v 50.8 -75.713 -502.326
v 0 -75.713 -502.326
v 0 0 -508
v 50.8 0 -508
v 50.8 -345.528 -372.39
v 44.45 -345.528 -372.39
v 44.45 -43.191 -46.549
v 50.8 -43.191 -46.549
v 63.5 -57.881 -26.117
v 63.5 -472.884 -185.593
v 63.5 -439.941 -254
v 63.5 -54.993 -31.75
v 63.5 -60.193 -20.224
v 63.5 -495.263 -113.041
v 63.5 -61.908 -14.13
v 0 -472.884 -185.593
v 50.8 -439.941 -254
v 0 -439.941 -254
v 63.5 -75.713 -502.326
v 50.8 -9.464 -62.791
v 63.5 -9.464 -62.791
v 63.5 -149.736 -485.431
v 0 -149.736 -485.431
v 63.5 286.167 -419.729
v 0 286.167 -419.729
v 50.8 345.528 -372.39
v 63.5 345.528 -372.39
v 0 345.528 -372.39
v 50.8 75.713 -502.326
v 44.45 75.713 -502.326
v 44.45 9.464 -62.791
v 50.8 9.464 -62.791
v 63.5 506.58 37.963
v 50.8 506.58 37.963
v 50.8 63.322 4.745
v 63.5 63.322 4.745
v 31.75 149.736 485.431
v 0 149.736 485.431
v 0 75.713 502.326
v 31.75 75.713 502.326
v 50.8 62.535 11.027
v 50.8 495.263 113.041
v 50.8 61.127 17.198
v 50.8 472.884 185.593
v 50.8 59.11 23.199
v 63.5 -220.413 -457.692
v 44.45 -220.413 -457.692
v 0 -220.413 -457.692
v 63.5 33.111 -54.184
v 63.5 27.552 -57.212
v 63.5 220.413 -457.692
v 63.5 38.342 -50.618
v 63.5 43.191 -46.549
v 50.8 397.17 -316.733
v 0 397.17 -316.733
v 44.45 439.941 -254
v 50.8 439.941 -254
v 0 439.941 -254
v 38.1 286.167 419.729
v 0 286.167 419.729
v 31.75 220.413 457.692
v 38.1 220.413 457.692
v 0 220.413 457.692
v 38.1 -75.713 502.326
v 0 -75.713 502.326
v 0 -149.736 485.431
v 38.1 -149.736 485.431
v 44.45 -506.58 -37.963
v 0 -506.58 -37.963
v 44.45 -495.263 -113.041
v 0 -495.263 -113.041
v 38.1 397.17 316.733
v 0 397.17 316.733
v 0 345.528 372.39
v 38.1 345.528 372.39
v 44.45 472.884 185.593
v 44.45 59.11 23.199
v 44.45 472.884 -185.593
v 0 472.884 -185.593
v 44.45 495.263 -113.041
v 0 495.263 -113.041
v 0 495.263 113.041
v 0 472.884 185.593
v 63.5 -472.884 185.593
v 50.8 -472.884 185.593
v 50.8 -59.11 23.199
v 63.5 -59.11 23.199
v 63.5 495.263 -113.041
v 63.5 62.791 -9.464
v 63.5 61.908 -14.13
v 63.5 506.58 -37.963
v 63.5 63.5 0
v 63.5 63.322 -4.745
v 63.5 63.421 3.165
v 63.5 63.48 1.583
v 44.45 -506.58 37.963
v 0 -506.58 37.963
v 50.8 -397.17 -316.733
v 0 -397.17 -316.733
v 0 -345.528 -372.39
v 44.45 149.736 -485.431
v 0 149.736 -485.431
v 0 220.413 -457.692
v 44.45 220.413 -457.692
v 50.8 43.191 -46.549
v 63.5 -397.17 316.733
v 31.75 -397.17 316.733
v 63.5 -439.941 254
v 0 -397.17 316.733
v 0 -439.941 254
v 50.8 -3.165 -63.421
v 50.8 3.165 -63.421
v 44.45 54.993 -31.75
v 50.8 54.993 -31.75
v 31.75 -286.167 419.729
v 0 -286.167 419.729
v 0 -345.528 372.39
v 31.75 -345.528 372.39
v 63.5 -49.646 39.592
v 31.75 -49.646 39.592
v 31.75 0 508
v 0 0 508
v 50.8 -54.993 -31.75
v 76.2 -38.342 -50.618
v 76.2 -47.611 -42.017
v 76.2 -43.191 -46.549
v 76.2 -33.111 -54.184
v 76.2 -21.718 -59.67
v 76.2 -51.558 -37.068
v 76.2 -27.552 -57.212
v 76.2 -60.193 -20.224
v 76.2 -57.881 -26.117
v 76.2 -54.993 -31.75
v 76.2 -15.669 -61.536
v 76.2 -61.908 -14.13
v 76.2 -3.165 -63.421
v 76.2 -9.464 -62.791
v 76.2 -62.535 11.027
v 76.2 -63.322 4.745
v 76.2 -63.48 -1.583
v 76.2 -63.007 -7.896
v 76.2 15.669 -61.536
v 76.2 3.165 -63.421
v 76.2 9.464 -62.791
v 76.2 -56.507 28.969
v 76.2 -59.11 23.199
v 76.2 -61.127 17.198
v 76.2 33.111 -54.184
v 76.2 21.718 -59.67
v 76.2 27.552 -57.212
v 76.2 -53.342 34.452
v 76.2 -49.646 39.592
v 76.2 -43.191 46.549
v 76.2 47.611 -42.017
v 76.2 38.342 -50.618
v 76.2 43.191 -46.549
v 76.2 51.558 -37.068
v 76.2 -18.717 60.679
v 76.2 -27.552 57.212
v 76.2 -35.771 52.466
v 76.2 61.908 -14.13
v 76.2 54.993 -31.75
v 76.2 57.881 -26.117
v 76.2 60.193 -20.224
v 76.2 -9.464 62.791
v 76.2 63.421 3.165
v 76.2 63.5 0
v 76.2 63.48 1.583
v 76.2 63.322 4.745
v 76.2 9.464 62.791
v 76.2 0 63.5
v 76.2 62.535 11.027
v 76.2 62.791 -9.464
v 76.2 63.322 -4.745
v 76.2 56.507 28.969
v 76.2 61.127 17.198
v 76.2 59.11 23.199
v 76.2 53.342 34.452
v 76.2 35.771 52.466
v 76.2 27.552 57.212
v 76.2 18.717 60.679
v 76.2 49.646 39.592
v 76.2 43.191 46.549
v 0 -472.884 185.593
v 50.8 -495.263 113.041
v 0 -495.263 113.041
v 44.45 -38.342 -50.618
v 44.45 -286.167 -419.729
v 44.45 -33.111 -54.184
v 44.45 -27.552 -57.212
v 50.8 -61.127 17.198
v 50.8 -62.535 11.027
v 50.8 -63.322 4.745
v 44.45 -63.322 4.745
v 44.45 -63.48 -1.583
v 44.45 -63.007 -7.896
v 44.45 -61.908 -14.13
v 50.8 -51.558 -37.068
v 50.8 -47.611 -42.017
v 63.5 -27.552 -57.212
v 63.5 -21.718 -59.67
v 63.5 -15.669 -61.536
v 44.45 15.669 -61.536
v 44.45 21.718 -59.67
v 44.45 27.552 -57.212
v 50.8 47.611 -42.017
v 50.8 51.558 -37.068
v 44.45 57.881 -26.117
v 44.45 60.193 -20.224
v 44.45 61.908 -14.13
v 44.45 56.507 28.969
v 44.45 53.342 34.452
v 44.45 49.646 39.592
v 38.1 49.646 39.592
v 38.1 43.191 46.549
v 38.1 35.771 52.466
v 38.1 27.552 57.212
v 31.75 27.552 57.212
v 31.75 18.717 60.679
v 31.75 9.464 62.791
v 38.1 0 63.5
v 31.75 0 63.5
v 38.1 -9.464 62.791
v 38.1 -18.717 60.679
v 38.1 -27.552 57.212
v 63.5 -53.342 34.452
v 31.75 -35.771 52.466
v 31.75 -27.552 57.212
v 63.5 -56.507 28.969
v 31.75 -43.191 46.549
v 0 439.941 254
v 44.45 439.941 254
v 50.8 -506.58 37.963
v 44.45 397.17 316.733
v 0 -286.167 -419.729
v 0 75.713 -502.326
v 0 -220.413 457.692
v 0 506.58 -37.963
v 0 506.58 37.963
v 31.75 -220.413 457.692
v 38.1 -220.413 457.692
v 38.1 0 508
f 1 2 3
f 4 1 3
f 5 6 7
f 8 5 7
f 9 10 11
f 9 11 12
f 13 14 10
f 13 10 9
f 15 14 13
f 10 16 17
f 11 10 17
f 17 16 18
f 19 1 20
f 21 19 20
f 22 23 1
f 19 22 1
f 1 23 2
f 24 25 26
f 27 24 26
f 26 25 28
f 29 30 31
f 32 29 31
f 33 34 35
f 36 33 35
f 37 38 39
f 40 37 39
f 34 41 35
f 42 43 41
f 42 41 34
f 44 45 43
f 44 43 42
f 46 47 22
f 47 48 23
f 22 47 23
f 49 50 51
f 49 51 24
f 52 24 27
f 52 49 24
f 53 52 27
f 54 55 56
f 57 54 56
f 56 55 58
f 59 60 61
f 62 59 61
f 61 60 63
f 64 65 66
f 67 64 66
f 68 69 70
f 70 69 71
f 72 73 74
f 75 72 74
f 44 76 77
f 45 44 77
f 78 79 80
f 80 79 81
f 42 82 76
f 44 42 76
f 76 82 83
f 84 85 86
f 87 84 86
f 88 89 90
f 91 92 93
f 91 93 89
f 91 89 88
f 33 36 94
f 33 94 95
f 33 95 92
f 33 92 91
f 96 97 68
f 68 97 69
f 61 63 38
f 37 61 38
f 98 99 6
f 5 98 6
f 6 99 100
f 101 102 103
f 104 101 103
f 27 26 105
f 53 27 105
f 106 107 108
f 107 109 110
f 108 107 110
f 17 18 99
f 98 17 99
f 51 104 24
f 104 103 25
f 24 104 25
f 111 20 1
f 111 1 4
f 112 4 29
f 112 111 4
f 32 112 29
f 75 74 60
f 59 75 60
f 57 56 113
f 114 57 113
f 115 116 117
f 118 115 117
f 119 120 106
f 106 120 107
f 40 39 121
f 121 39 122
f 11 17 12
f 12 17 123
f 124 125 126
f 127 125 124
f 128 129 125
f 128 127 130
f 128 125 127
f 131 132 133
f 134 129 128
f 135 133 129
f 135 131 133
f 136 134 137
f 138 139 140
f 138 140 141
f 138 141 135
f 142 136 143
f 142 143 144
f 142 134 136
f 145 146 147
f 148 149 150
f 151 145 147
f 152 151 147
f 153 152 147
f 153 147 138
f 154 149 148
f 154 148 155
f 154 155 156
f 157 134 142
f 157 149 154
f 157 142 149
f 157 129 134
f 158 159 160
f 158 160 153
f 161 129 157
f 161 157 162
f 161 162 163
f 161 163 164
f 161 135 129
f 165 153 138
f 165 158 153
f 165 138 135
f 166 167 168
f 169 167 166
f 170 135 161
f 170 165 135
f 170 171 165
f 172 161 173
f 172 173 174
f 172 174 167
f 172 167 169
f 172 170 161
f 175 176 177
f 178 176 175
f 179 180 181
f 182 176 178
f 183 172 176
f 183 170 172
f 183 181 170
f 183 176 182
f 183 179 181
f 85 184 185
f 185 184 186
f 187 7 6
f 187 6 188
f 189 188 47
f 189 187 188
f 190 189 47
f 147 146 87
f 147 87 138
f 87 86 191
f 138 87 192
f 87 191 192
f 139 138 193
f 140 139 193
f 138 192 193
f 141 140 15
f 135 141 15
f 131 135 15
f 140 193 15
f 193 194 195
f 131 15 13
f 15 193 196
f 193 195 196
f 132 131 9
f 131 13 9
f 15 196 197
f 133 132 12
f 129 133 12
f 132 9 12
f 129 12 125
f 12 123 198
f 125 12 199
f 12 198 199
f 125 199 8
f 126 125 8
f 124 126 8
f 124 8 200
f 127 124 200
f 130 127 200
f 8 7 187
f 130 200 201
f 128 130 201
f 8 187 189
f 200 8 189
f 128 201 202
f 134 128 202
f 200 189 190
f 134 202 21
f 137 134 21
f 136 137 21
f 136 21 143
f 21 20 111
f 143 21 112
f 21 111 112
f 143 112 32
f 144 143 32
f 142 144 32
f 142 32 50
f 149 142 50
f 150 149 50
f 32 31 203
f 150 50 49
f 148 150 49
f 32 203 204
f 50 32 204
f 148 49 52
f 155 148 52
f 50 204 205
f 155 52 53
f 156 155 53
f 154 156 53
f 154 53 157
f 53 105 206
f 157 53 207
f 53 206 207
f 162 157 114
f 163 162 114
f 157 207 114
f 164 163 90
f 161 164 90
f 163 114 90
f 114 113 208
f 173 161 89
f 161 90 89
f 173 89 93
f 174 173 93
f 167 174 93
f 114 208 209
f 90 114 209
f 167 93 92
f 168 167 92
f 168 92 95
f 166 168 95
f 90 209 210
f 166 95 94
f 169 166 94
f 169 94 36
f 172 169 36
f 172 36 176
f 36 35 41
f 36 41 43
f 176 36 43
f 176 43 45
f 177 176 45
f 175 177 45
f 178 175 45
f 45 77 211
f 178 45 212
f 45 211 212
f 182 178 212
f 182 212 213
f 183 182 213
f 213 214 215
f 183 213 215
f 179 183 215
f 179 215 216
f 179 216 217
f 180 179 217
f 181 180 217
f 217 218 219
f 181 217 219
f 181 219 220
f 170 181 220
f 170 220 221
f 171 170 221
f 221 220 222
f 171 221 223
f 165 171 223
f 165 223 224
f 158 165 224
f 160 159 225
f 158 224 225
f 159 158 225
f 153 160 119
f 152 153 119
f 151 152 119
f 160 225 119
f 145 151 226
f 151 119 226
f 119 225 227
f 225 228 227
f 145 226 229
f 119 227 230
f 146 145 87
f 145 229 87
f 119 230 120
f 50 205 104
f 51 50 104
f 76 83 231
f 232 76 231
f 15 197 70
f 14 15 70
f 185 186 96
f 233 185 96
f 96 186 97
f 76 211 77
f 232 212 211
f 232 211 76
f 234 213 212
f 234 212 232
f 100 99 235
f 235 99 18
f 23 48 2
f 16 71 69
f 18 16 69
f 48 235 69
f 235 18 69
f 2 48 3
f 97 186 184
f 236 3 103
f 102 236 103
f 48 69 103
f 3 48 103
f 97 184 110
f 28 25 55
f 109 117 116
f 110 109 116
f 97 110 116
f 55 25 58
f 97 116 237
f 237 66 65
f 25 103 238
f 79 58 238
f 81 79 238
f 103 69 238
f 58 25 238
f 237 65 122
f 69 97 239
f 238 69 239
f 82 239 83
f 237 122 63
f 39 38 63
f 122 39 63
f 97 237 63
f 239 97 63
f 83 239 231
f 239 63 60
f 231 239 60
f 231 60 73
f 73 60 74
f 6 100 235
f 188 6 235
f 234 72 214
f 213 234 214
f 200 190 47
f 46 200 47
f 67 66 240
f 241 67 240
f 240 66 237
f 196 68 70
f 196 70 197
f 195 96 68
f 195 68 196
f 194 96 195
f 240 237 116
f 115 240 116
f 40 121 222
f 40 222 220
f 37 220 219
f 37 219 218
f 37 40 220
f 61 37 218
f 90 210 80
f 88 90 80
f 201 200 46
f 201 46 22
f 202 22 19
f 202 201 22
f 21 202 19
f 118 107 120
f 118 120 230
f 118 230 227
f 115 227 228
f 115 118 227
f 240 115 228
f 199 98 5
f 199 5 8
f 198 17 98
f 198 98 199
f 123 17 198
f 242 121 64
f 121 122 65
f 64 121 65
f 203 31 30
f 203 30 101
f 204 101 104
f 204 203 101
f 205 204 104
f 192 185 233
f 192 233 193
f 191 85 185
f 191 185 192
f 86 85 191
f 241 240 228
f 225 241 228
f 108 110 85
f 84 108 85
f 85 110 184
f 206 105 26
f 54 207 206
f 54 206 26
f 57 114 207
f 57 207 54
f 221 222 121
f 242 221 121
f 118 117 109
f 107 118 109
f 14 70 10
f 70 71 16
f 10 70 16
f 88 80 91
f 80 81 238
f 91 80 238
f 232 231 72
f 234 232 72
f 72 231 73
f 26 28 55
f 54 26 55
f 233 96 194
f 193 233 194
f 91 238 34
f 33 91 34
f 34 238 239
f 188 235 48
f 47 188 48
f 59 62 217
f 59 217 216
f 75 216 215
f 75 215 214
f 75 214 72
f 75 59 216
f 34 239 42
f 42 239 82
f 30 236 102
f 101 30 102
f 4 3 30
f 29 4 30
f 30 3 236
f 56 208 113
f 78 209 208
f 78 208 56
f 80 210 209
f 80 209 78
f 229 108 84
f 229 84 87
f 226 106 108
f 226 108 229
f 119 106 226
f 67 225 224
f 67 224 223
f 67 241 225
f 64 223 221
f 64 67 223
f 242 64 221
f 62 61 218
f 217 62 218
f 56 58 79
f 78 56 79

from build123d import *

# Parameters (mm, degrees)
F1_DEPTH = 25.4
F2_DEPTH = 31.75
F3_DEPTH = 38.1
F4_DEPTH = 44.45
F5_DEPTH = 50.8
F6_DEPTH = 63.5
F7_DEPTH = 76.2


with BuildPart() as f1:
    # F0 (on Right) → F1 (new body)
    with BuildSketch(Plane.YZ):
        with BuildLine():
            ThreePointArc((-27.551617434, 57.2115231118), (-14.1300793062, 61.9079224235), (0, 63.5))
            Line((0, 63.5), (0, 508))
            Line((0, 508), (-75.7134712175, 502.3260597224))
            Line((-75.7134712175, 502.3260597224), (-149.7356286007, 485.4309853394))
            Line((-149.7356286007, 485.4309853394), (-220.4129394717, 457.6921848944))
            Line((-220.4129394717, 457.6921848944), (-27.551617434, 57.2115231118))
        make_face()
        with BuildLine():
            Line((0, 508), (0, 63.5))
            ThreePointArc((0, 63.5), (14.1300793062, 61.9079224235), (27.551617434, 57.2115231118))
            Line((27.551617434, 57.2115231118), (220.4129394717, 457.6921848944))
            Line((220.4129394717, 457.6921848944), (149.7356286007, 485.4309853394))
            Line((149.7356286007, 485.4309853394), (75.7134712175, 502.3260597224))
            Line((75.7134712175, 502.3260597224), (0, 508))
        make_face()
        with BuildLine():
            Line((220.4129394717, 457.6921848944), (27.551617434, 57.2115231118))
            ThreePointArc((27.551617434, 57.2115231118), (39.591602418, 49.6462991367), (49.6462991367, 39.591602418))
            Line((49.6462991367, 39.591602418), (397.1703930938, 316.7328193442))
            Line((397.1703930938, 316.7328193442), (345.5277507876, 372.3903508896))
            Line((345.5277507876, 372.3903508896), (286.1665894963, 419.7292973525))
            Line((286.1665894963, 419.7292973525), (220.4129394717, 457.6921848944))
        make_face()
        with BuildLine():
            Line((59.1104830389, 23.1991550473), (472.8838643113, 185.5932403781))
            Line((472.8838643113, 185.5932403781), (439.9409051225, 254))
            Line((439.9409051225, 254), (397.1703930938, 316.7328193442))
            Line((397.1703930938, 316.7328193442), (49.6462991367, 39.591602418))
            ThreePointArc((49.6462991367, 39.591602418), (54.9926131403, 31.75), (59.1104830389, 23.1991550473))
        make_face()
        with BuildLine():
            Line((63.322441121, 4.7453609427), (506.579528968, 37.9628875419))
            Line((506.579528968, 37.9628875419), (495.2633793884, 113.0406344498))
            Line((495.2633793884, 113.0406344498), (472.8838643113, 185.5932403781))
            Line((472.8838643113, 185.5932403781), (59.1104830389, 23.1991550473))
            ThreePointArc((59.1104830389, 23.1991550473), (61.9079224235, 14.1300793062), (63.322441121, 4.7453609427))
        make_face()
        with BuildLine():
            Line((506.579528968, -37.9628875419), (506.579528968, 37.9628875419))
            Line((506.579528968, 37.9628875419), (63.322441121, 4.7453609427))
            ThreePointArc((63.322441121, 4.7453609427), (63.4555947541, 2.3743408365), (63.5, 0))
            ThreePointArc((63.5, 0), (63.1007253282, -7.1097442326), (61.9079224235, -14.1300793062))
            Line((61.9079224235, -14.1300793062), (495.2633793884, -113.0406344498))
            Line((495.2633793884, -113.0406344498), (506.579528968, -37.9628875419))
        make_face()
        with BuildLine():
            Line((472.8838643113, -185.5932403781), (495.2633793884, -113.0406344498))
            Line((495.2633793884, -113.0406344498), (61.9079224235, -14.1300793062))
            ThreePointArc((61.9079224235, -14.1300793062), (59.1104830389, -23.1991550473), (54.9926131403, -31.75))
            Line((54.9926131403, -31.75), (439.9409051225, -254))
            Line((439.9409051225, -254), (472.8838643113, -185.5932403781))
        make_face()
        with BuildLine():
            Line((439.9409051225, -254), (54.9926131403, -31.75))
            ThreePointArc((54.9926131403, -31.75), (49.6462991367, -39.591602418), (43.1909688485, -46.5487938612))
            Line((43.1909688485, -46.5487938612), (345.5277507876, -372.3903508896))
            Line((345.5277507876, -372.3903508896), (397.1703930938, -316.7328193442))
            Line((397.1703930938, -316.7328193442), (439.9409051225, -254))
        make_face()
        with BuildLine():
            Line((345.5277507876, -372.3903508896), (43.1909688485, -46.5487938612))
            ThreePointArc((43.1909688485, -46.5487938612), (35.770823687, -52.4661621691), (27.551617434, -57.2115231118))
            Line((27.551617434, -57.2115231118), (220.4129394717, -457.6921848944))
            Line((220.4129394717, -457.6921848944), (286.1665894963, -419.7292973525))
            Line((286.1665894963, -419.7292973525), (345.5277507876, -372.3903508896))
        make_face()
        with BuildLine():
            Line((220.4129394717, -457.6921848944), (27.551617434, -57.2115231118))
            ThreePointArc((27.551617434, -57.2115231118), (18.7169535751, -60.6788731674), (9.4641839022, -62.7907574653))
            Line((9.4641839022, -62.7907574653), (75.7134712175, -502.3260597224))
            Line((75.7134712175, -502.3260597224), (149.7356286007, -485.4309853394))
            Line((149.7356286007, -485.4309853394), (220.4129394717, -457.6921848944))
        make_face()
        with BuildLine():
            Line((75.7134712175, -502.3260597224), (9.4641839022, -62.7907574653))
            ThreePointArc((9.4641839022, -62.7907574653), (0, -63.5), (-9.4641839022, -62.7907574653))
            Line((-9.4641839022, -62.7907574653), (-75.7134712175, -502.3260597224))
            Line((-75.7134712175, -502.3260597224), (0, -508))
            Line((0, -508), (75.7134712175, -502.3260597224))
        make_face()
        with BuildLine():
            Line((-75.7134712175, -502.3260597224), (-9.4641839022, -62.7907574653))
            ThreePointArc((-9.4641839022, -62.7907574653), (-18.7169535751, -60.6788731674), (-27.551617434, -57.2115231118))
            Line((-27.551617434, -57.2115231118), (-220.4129394717, -457.6921848944))
            Line((-220.4129394717, -457.6921848944), (-149.7356286007, -485.4309853394))
            Line((-149.7356286007, -485.4309853394), (-75.7134712175, -502.3260597224))
        make_face()
        with BuildLine():
            Line((-220.4129394717, -457.6921848944), (-27.551617434, -57.2115231118))
            ThreePointArc((-27.551617434, -57.2115231118), (-35.770823687, -52.4661621691), (-43.1909688485, -46.5487938612))
            Line((-43.1909688485, -46.5487938612), (-345.5277507876, -372.3903508896))
            Line((-345.5277507876, -372.3903508896), (-286.1665894963, -419.7292973525))
            Line((-286.1665894963, -419.7292973525), (-220.4129394717, -457.6921848944))
        make_face()
        with BuildLine():
            Line((-345.5277507876, -372.3903508896), (-43.1909688485, -46.5487938612))
            ThreePointArc((-43.1909688485, -46.5487938612), (-49.6462991367, -39.591602418), (-54.9926131403, -31.75))
            Line((-54.9926131403, -31.75), (-439.9409051225, -254))
            Line((-439.9409051225, -254), (-397.1703930938, -316.7328193442))
            Line((-397.1703930938, -316.7328193442), (-345.5277507876, -372.3903508896))
        make_face()
        with BuildLine():
            Line((-439.9409051225, -254), (-54.9926131403, -31.75))
            ThreePointArc((-54.9926131403, -31.75), (-59.1104830389, -23.1991550473), (-61.9079224235, -14.1300793062))
            Line((-61.9079224235, -14.1300793062), (-495.2633793884, -113.0406344498))
            Line((-495.2633793884, -113.0406344498), (-472.8838643113, -185.5932403781))
            Line((-472.8838643113, -185.5932403781), (-439.9409051225, -254))
        make_face()
        with BuildLine():
            Line((-495.2633793884, -113.0406344498), (-61.9079224235, -14.1300793062))
            ThreePointArc((-61.9079224235, -14.1300793062), (-63.322441121, -4.7453609427), (-63.322441121, 4.7453609427))
            Line((-63.322441121, 4.7453609427), (-506.579528968, 37.9628875419))
            Line((-506.579528968, 37.9628875419), (-506.579528968, -37.9628875419))
            Line((-506.579528968, -37.9628875419), (-495.2633793884, -113.0406344498))
        make_face()
        with BuildLine():
            Line((-506.579528968, 37.9628875419), (-63.322441121, 4.7453609427))
            ThreePointArc((-63.322441121, 4.7453609427), (-61.9079224235, 14.1300793062), (-59.1104830389, 23.1991550473))
            Line((-59.1104830389, 23.1991550473), (-472.8838643113, 185.5932403781))
            Line((-472.8838643113, 185.5932403781), (-495.2633793884, 113.0406344498))
            Line((-495.2633793884, 113.0406344498), (-506.579528968, 37.9628875419))
        make_face()
        with BuildLine():
            ThreePointArc((-59.1104830389, 23.1991550473), (-54.9926131403, 31.75), (-49.6462991367, 39.591602418))
            Line((-49.6462991367, 39.591602418), (-397.1703930938, 316.7328193442))
            Line((-397.1703930938, 316.7328193442), (-439.9409051225, 254))
            Line((-439.9409051225, 254), (-472.8838643113, 185.5932403781))
            Line((-472.8838643113, 185.5932403781), (-59.1104830389, 23.1991550473))
        make_face()
        with BuildLine():
            ThreePointArc((-49.6462991367, 39.591602418), (-39.591602418, 49.6462991367), (-27.551617434, 57.2115231118))
            Line((-27.551617434, 57.2115231118), (-220.4129394717, 457.6921848944))
            Line((-220.4129394717, 457.6921848944), (-286.1665894963, 419.7292973525))
            Line((-286.1665894963, 419.7292973525), (-345.5277507876, 372.3903508896))
            Line((-345.5277507876, 372.3903508896), (-397.1703930938, 316.7328193442))
            Line((-397.1703930938, 316.7328193442), (-49.6462991367, 39.591602418))
        make_face()
    extrude(amount=F1_DEPTH)

    # F0 (on Right) → F2 (join)
    with BuildSketch(Plane.YZ):
        with BuildLine():
            Line((0, 508), (0, 63.5))
            ThreePointArc((0, 63.5), (14.1300793062, 61.9079224235), (27.551617434, 57.2115231118))
            Line((27.551617434, 57.2115231118), (220.4129394717, 457.6921848944))
            Line((220.4129394717, 457.6921848944), (149.7356286007, 485.4309853394))
            Line((149.7356286007, 485.4309853394), (75.7134712175, 502.3260597224))
            Line((75.7134712175, 502.3260597224), (0, 508))
        make_face()
        with BuildLine():
            ThreePointArc((-49.6462991367, 39.591602418), (-39.591602418, 49.6462991367), (-27.551617434, 57.2115231118))
            Line((-27.551617434, 57.2115231118), (-220.4129394717, 457.6921848944))
            Line((-220.4129394717, 457.6921848944), (-286.1665894963, 419.7292973525))
            Line((-286.1665894963, 419.7292973525), (-345.5277507876, 372.3903508896))
            Line((-345.5277507876, 372.3903508896), (-397.1703930938, 316.7328193442))
            Line((-397.1703930938, 316.7328193442), (-49.6462991367, 39.591602418))
        make_face()
        with BuildLine():
            Line((0, 63.5), (0, 0))
            Line((0, 0), (27.551617434, 57.2115231118))
            ThreePointArc((27.551617434, 57.2115231118), (14.1300793062, 61.9079224235), (0, 63.5))
        make_face()
        with BuildLine():
            Line((-27.551617434, 57.2115231118), (0, 0))
            Line((0, 0), (0, 63.5))
            ThreePointArc((0, 63.5), (-14.1300793062, 61.9079224235), (-27.551617434, 57.2115231118))
        make_face()
        with BuildLine():
            Line((-49.6462991367, 39.591602418), (0, 0))
            Line((0, 0), (-27.551617434, 57.2115231118))
            ThreePointArc((-27.551617434, 57.2115231118), (-39.591602418, 49.6462991367), (-49.6462991367, 39.591602418))
        make_face()
    extrude(amount=F2_DEPTH)

    # F0 (on Right) → F3 (join)
    with BuildSketch(Plane.YZ):
        with BuildLine():
            ThreePointArc((-27.551617434, 57.2115231118), (-14.1300793062, 61.9079224235), (0, 63.5))
            Line((0, 63.5), (0, 508))
            Line((0, 508), (-75.7134712175, 502.3260597224))
            Line((-75.7134712175, 502.3260597224), (-149.7356286007, 485.4309853394))
            Line((-149.7356286007, 485.4309853394), (-220.4129394717, 457.6921848944))
            Line((-220.4129394717, 457.6921848944), (-27.551617434, 57.2115231118))
        make_face()
        with BuildLine():
            Line((220.4129394717, 457.6921848944), (27.551617434, 57.2115231118))
            ThreePointArc((27.551617434, 57.2115231118), (39.591602418, 49.6462991367), (49.6462991367, 39.591602418))
            Line((49.6462991367, 39.591602418), (397.1703930938, 316.7328193442))
            Line((397.1703930938, 316.7328193442), (345.5277507876, 372.3903508896))
            Line((345.5277507876, 372.3903508896), (286.1665894963, 419.7292973525))
            Line((286.1665894963, 419.7292973525), (220.4129394717, 457.6921848944))
        make_face()
        with BuildLine():
            Line((27.551617434, 57.2115231118), (0, 0))
            Line((0, 0), (49.6462991367, 39.591602418))
            ThreePointArc((49.6462991367, 39.591602418), (39.591602418, 49.6462991367), (27.551617434, 57.2115231118))
        make_face()
        with BuildLine():
            Line((0, 63.5), (0, 0))
            Line((0, 0), (27.551617434, 57.2115231118))
            ThreePointArc((27.551617434, 57.2115231118), (14.1300793062, 61.9079224235), (0, 63.5))
        make_face()
        with BuildLine():
            Line((-27.551617434, 57.2115231118), (0, 0))
            Line((0, 0), (0, 63.5))
            ThreePointArc((0, 63.5), (-14.1300793062, 61.9079224235), (-27.551617434, 57.2115231118))
        make_face()
    extrude(amount=F3_DEPTH)

    # F0 (on Right) → F4 (join)
    with BuildSketch(Plane.YZ):
        with BuildLine():
            Line((59.1104830389, 23.1991550473), (472.8838643113, 185.5932403781))
            Line((472.8838643113, 185.5932403781), (439.9409051225, 254))
            Line((439.9409051225, 254), (397.1703930938, 316.7328193442))
            Line((397.1703930938, 316.7328193442), (49.6462991367, 39.591602418))
            ThreePointArc((49.6462991367, 39.591602418), (54.9926131403, 31.75), (59.1104830389, 23.1991550473))
        make_face()
        with BuildLine():
            Line((472.8838643113, -185.5932403781), (495.2633793884, -113.0406344498))
            Line((495.2633793884, -113.0406344498), (61.9079224235, -14.1300793062))
            ThreePointArc((61.9079224235, -14.1300793062), (59.1104830389, -23.1991550473), (54.9926131403, -31.75))
            Line((54.9926131403, -31.75), (439.9409051225, -254))
            Line((439.9409051225, -254), (472.8838643113, -185.5932403781))
        make_face()
        with BuildLine():
            Line((220.4129394717, -457.6921848944), (27.551617434, -57.2115231118))
            ThreePointArc((27.551617434, -57.2115231118), (18.7169535751, -60.6788731674), (9.4641839022, -62.7907574653))
            Line((9.4641839022, -62.7907574653), (75.7134712175, -502.3260597224))
            Line((75.7134712175, -502.3260597224), (149.7356286007, -485.4309853394))
            Line((149.7356286007, -485.4309853394), (220.4129394717, -457.6921848944))
        make_face()
        with BuildLine():
            Line((-220.4129394717, -457.6921848944), (-27.551617434, -57.2115231118))
            ThreePointArc((-27.551617434, -57.2115231118), (-35.770823687, -52.4661621691), (-43.1909688485, -46.5487938612))
            Line((-43.1909688485, -46.5487938612), (-345.5277507876, -372.3903508896))
            Line((-345.5277507876, -372.3903508896), (-286.1665894963, -419.7292973525))
            Line((-286.1665894963, -419.7292973525), (-220.4129394717, -457.6921848944))
        make_face()
        with BuildLine():
            Line((-495.2633793884, -113.0406344498), (-61.9079224235, -14.1300793062))
            ThreePointArc((-61.9079224235, -14.1300793062), (-63.322441121, -4.7453609427), (-63.322441121, 4.7453609427))
            Line((-63.322441121, 4.7453609427), (-506.579528968, 37.9628875419))
            Line((-506.579528968, 37.9628875419), (-506.579528968, -37.9628875419))
            Line((-506.579528968, -37.9628875419), (-495.2633793884, -113.0406344498))
        make_face()
        with BuildLine():
            Line((49.6462991367, 39.591602418), (0, 0))
            Line((0, 0), (59.1104830389, 23.1991550473))
            ThreePointArc((59.1104830389, 23.1991550473), (54.9926131403, 31.75), (49.6462991367, 39.591602418))
        make_face()
        with BuildLine():
            Line((0, 0), (63.322441121, 4.7453609427))
            ThreePointArc((63.322441121, 4.7453609427), (61.9079224235, 14.1300793062), (59.1104830389, 23.1991550473))
            Line((59.1104830389, 23.1991550473), (0, 0))
        make_face()
        with BuildLine():
            ThreePointArc((63.5, 0), (63.4555947541, 2.3743408365), (63.322441121, 4.7453609427))
            Line((63.322441121, 4.7453609427), (0, 0))
            Line((0, 0), (61.9079224235, -14.1300793062))
            ThreePointArc((61.9079224235, -14.1300793062), (63.1007253282, -7.1097442326), (63.5, 0))
        make_face()
        with BuildLine():
            Line((61.9079224235, -14.1300793062), (0, 0))
            Line((0, 0), (54.9926131403, -31.75))
            ThreePointArc((54.9926131403, -31.75), (59.1104830389, -23.1991550473), (61.9079224235, -14.1300793062))
        make_face()
        with BuildLine():
            Line((54.9926131403, -31.75), (0, 0))
            Line((0, 0), (43.1909688485, -46.5487938612))
            ThreePointArc((43.1909688485, -46.5487938612), (49.6462991367, -39.591602418), (54.9926131403, -31.75))
        make_face()
        with BuildLine():
            Line((43.1909688485, -46.5487938612), (0, 0))
            Line((0, 0), (27.551617434, -57.2115231118))
            ThreePointArc((27.551617434, -57.2115231118), (35.770823687, -52.4661621691), (43.1909688485, -46.5487938612))
        make_face()
        with BuildLine():
            Line((27.551617434, -57.2115231118), (0, 0))
            Line((0, 0), (9.4641839022, -62.7907574653))
            ThreePointArc((9.4641839022, -62.7907574653), (18.7169535751, -60.6788731674), (27.551617434, -57.2115231118))
        make_face()
        with BuildLine():
            Line((9.4641839022, -62.7907574653), (0, 0))
            Line((0, 0), (-9.4641839022, -62.7907574653))
            ThreePointArc((-9.4641839022, -62.7907574653), (0, -63.5), (9.4641839022, -62.7907574653))
        make_face()
        with BuildLine():
            Line((-9.4641839022, -62.7907574653), (0, 0))
            Line((0, 0), (-27.551617434, -57.2115231118))
            ThreePointArc((-27.551617434, -57.2115231118), (-18.7169535751, -60.6788731674), (-9.4641839022, -62.7907574653))
        make_face()
        with BuildLine():
            Line((-27.551617434, -57.2115231118), (0, 0))
            Line((0, 0), (-43.1909688485, -46.5487938612))
            ThreePointArc((-43.1909688485, -46.5487938612), (-35.770823687, -52.4661621691), (-27.551617434, -57.2115231118))
        make_face()
        with BuildLine():
            Line((-43.1909688485, -46.5487938612), (0, 0))
            Line((0, 0), (-54.9926131403, -31.75))
            ThreePointArc((-54.9926131403, -31.75), (-49.6462991367, -39.591602418), (-43.1909688485, -46.5487938612))
        make_face()
        with BuildLine():
            Line((-54.9926131403, -31.75), (0, 0))
            Line((0, 0), (-61.9079224235, -14.1300793062))
            ThreePointArc((-61.9079224235, -14.1300793062), (-59.1104830389, -23.1991550473), (-54.9926131403, -31.75))
        make_face()
        with BuildLine():
            Line((-61.9079224235, -14.1300793062), (0, 0))
            Line((0, 0), (-63.322441121, 4.7453609427))
            ThreePointArc((-63.322441121, 4.7453609427), (-63.322441121, -4.7453609427), (-61.9079224235, -14.1300793062))
        make_face()
    extrude(amount=F4_DEPTH)

    # F0 (on Right) → F5 (join)
    with BuildSketch(Plane.YZ):
        with BuildLine():
            Line((63.322441121, 4.7453609427), (506.579528968, 37.9628875419))
            Line((506.579528968, 37.9628875419), (495.2633793884, 113.0406344498))
            Line((495.2633793884, 113.0406344498), (472.8838643113, 185.5932403781))
            Line((472.8838643113, 185.5932403781), (59.1104830389, 23.1991550473))
            ThreePointArc((59.1104830389, 23.1991550473), (61.9079224235, 14.1300793062), (63.322441121, 4.7453609427))
        make_face()
        with BuildLine():
            Line((439.9409051225, -254), (54.9926131403, -31.75))
            ThreePointArc((54.9926131403, -31.75), (49.6462991367, -39.591602418), (43.1909688485, -46.5487938612))
            Line((43.1909688485, -46.5487938612), (345.5277507876, -372.3903508896))
            Line((345.5277507876, -372.3903508896), (397.1703930938, -316.7328193442))
            Line((397.1703930938, -316.7328193442), (439.9409051225, -254))
        make_face()
        with BuildLine():
            Line((75.7134712175, -502.3260597224), (9.4641839022, -62.7907574653))
            ThreePointArc((9.4641839022, -62.7907574653), (0, -63.5), (-9.4641839022, -62.7907574653))
            Line((-9.4641839022, -62.7907574653), (-75.7134712175, -502.3260597224))
            Line((-75.7134712175, -502.3260597224), (0, -508))
            Line((0, -508), (75.7134712175, -502.3260597224))
        make_face()
        with BuildLine():
            Line((-345.5277507876, -372.3903508896), (-43.1909688485, -46.5487938612))
            ThreePointArc((-43.1909688485, -46.5487938612), (-49.6462991367, -39.591602418), (-54.9926131403, -31.75))
            Line((-54.9926131403, -31.75), (-439.9409051225, -254))
            Line((-439.9409051225, -254), (-397.1703930938, -316.7328193442))
            Line((-397.1703930938, -316.7328193442), (-345.5277507876, -372.3903508896))
        make_face()
        with BuildLine():
            Line((-506.579528968, 37.9628875419), (-63.322441121, 4.7453609427))
            ThreePointArc((-63.322441121, 4.7453609427), (-61.9079224235, 14.1300793062), (-59.1104830389, 23.1991550473))
            Line((-59.1104830389, 23.1991550473), (-472.8838643113, 185.5932403781))
            Line((-472.8838643113, 185.5932403781), (-495.2633793884, 113.0406344498))
            Line((-495.2633793884, 113.0406344498), (-506.579528968, 37.9628875419))
        make_face()
        with BuildLine():
            Line((0, 0), (63.322441121, 4.7453609427))
            ThreePointArc((63.322441121, 4.7453609427), (61.9079224235, 14.1300793062), (59.1104830389, 23.1991550473))
            Line((59.1104830389, 23.1991550473), (0, 0))
        make_face()
        with BuildLine():
            ThreePointArc((63.5, 0), (63.4555947541, 2.3743408365), (63.322441121, 4.7453609427))
            Line((63.322441121, 4.7453609427), (0, 0))
            Line((0, 0), (61.9079224235, -14.1300793062))
            ThreePointArc((61.9079224235, -14.1300793062), (63.1007253282, -7.1097442326), (63.5, 0))
        make_face()
        with BuildLine():
            Line((61.9079224235, -14.1300793062), (0, 0))
            Line((0, 0), (54.9926131403, -31.75))
            ThreePointArc((54.9926131403, -31.75), (59.1104830389, -23.1991550473), (61.9079224235, -14.1300793062))
        make_face()
        with BuildLine():
            Line((54.9926131403, -31.75), (0, 0))
            Line((0, 0), (43.1909688485, -46.5487938612))
            ThreePointArc((43.1909688485, -46.5487938612), (49.6462991367, -39.591602418), (54.9926131403, -31.75))
        make_face()
        with BuildLine():
            Line((43.1909688485, -46.5487938612), (0, 0))
            Line((0, 0), (27.551617434, -57.2115231118))
            ThreePointArc((27.551617434, -57.2115231118), (35.770823687, -52.4661621691), (43.1909688485, -46.5487938612))
        make_face()
        with BuildLine():
            Line((27.551617434, -57.2115231118), (0, 0))
            Line((0, 0), (9.4641839022, -62.7907574653))
            ThreePointArc((9.4641839022, -62.7907574653), (18.7169535751, -60.6788731674), (27.551617434, -57.2115231118))
        make_face()
        with BuildLine():
            Line((9.4641839022, -62.7907574653), (0, 0))
            Line((0, 0), (-9.4641839022, -62.7907574653))
            ThreePointArc((-9.4641839022, -62.7907574653), (0, -63.5), (9.4641839022, -62.7907574653))
        make_face()
        with BuildLine():
            Line((-9.4641839022, -62.7907574653), (0, 0))
            Line((0, 0), (-27.551617434, -57.2115231118))
            ThreePointArc((-27.551617434, -57.2115231118), (-18.7169535751, -60.6788731674), (-9.4641839022, -62.7907574653))
        make_face()
        with BuildLine():
            Line((-27.551617434, -57.2115231118), (0, 0))
            Line((0, 0), (-43.1909688485, -46.5487938612))
            ThreePointArc((-43.1909688485, -46.5487938612), (-35.770823687, -52.4661621691), (-27.551617434, -57.2115231118))
        make_face()
        with BuildLine():
            Line((-43.1909688485, -46.5487938612), (0, 0))
            Line((0, 0), (-54.9926131403, -31.75))
            ThreePointArc((-54.9926131403, -31.75), (-49.6462991367, -39.591602418), (-43.1909688485, -46.5487938612))
        make_face()
        with BuildLine():
            Line((-54.9926131403, -31.75), (0, 0))
            Line((0, 0), (-61.9079224235, -14.1300793062))
            ThreePointArc((-61.9079224235, -14.1300793062), (-59.1104830389, -23.1991550473), (-54.9926131403, -31.75))
        make_face()
        with BuildLine():
            Line((-61.9079224235, -14.1300793062), (0, 0))
            Line((0, 0), (-63.322441121, 4.7453609427))
            ThreePointArc((-63.322441121, 4.7453609427), (-63.322441121, -4.7453609427), (-61.9079224235, -14.1300793062))
        make_face()
        with BuildLine():
            Line((-63.322441121, 4.7453609427), (0, 0))
            Line((0, 0), (-59.1104830389, 23.1991550473))
            ThreePointArc((-59.1104830389, 23.1991550473), (-61.9079224235, 14.1300793062), (-63.322441121, 4.7453609427))
        make_face()
    extrude(amount=F5_DEPTH)

    # F0 (on Right) → F6 (join)
    with BuildSketch(Plane.YZ):
        with BuildLine():
            Line((506.579528968, -37.9628875419), (506.579528968, 37.9628875419))
            Line((506.579528968, 37.9628875419), (63.322441121, 4.7453609427))
            ThreePointArc((63.322441121, 4.7453609427), (63.4555947541, 2.3743408365), (63.5, 0))
            ThreePointArc((63.5, 0), (63.1007253282, -7.1097442326), (61.9079224235, -14.1300793062))
            Line((61.9079224235, -14.1300793062), (495.2633793884, -113.0406344498))
            Line((495.2633793884, -113.0406344498), (506.579528968, -37.9628875419))
        make_face()
        with BuildLine():
            Line((345.5277507876, -372.3903508896), (43.1909688485, -46.5487938612))
            ThreePointArc((43.1909688485, -46.5487938612), (35.770823687, -52.4661621691), (27.551617434, -57.2115231118))
            Line((27.551617434, -57.2115231118), (220.4129394717, -457.6921848944))
            Line((220.4129394717, -457.6921848944), (286.1665894963, -419.7292973525))
            Line((286.1665894963, -419.7292973525), (345.5277507876, -372.3903508896))
        make_face()
        with BuildLine():
            Line((-75.7134712175, -502.3260597224), (-9.4641839022, -62.7907574653))
            ThreePointArc((-9.4641839022, -62.7907574653), (-18.7169535751, -60.6788731674), (-27.551617434, -57.2115231118))
            Line((-27.551617434, -57.2115231118), (-220.4129394717, -457.6921848944))
            Line((-220.4129394717, -457.6921848944), (-149.7356286007, -485.4309853394))
            Line((-149.7356286007, -485.4309853394), (-75.7134712175, -502.3260597224))
        make_face()
        with BuildLine():
            Line((-439.9409051225, -254), (-54.9926131403, -31.75))
            ThreePointArc((-54.9926131403, -31.75), (-59.1104830389, -23.1991550473), (-61.9079224235, -14.1300793062))
            Line((-61.9079224235, -14.1300793062), (-495.2633793884, -113.0406344498))
            Line((-495.2633793884, -113.0406344498), (-472.8838643113, -185.5932403781))
            Line((-472.8838643113, -185.5932403781), (-439.9409051225, -254))
        make_face()
        with BuildLine():
            ThreePointArc((-59.1104830389, 23.1991550473), (-54.9926131403, 31.75), (-49.6462991367, 39.591602418))
            Line((-49.6462991367, 39.591602418), (-397.1703930938, 316.7328193442))
            Line((-397.1703930938, 316.7328193442), (-439.9409051225, 254))
            Line((-439.9409051225, 254), (-472.8838643113, 185.5932403781))
            Line((-472.8838643113, 185.5932403781), (-59.1104830389, 23.1991550473))
        make_face()
        with BuildLine():
            ThreePointArc((63.5, 0), (63.4555947541, 2.3743408365), (63.322441121, 4.7453609427))
            Line((63.322441121, 4.7453609427), (0, 0))
            Line((0, 0), (61.9079224235, -14.1300793062))
            ThreePointArc((61.9079224235, -14.1300793062), (63.1007253282, -7.1097442326), (63.5, 0))
        make_face()
        with BuildLine():
            Line((61.9079224235, -14.1300793062), (0, 0))
            Line((0, 0), (54.9926131403, -31.75))
            ThreePointArc((54.9926131403, -31.75), (59.1104830389, -23.1991550473), (61.9079224235, -14.1300793062))
        make_face()
        with BuildLine():
            Line((54.9926131403, -31.75), (0, 0))
            Line((0, 0), (43.1909688485, -46.5487938612))
            ThreePointArc((43.1909688485, -46.5487938612), (49.6462991367, -39.591602418), (54.9926131403, -31.75))
        make_face()
        with BuildLine():
            Line((43.1909688485, -46.5487938612), (0, 0))
            Line((0, 0), (27.551617434, -57.2115231118))
            ThreePointArc((27.551617434, -57.2115231118), (35.770823687, -52.4661621691), (43.1909688485, -46.5487938612))
        make_face()
        with BuildLine():
            Line((27.551617434, -57.2115231118), (0, 0))
            Line((0, 0), (9.4641839022, -62.7907574653))
            ThreePointArc((9.4641839022, -62.7907574653), (18.7169535751, -60.6788731674), (27.551617434, -57.2115231118))
        make_face()
        with BuildLine():
            Line((9.4641839022, -62.7907574653), (0, 0))
            Line((0, 0), (-9.4641839022, -62.7907574653))
            ThreePointArc((-9.4641839022, -62.7907574653), (0, -63.5), (9.4641839022, -62.7907574653))
        make_face()
        with BuildLine():
            Line((-9.4641839022, -62.7907574653), (0, 0))
            Line((0, 0), (-27.551617434, -57.2115231118))
            ThreePointArc((-27.551617434, -57.2115231118), (-18.7169535751, -60.6788731674), (-9.4641839022, -62.7907574653))
        make_face()
        with BuildLine():
            Line((-27.551617434, -57.2115231118), (0, 0))
            Line((0, 0), (-43.1909688485, -46.5487938612))
            ThreePointArc((-43.1909688485, -46.5487938612), (-35.770823687, -52.4661621691), (-27.551617434, -57.2115231118))
        make_face()
        with BuildLine():
            Line((-43.1909688485, -46.5487938612), (0, 0))
            Line((0, 0), (-54.9926131403, -31.75))
            ThreePointArc((-54.9926131403, -31.75), (-49.6462991367, -39.591602418), (-43.1909688485, -46.5487938612))
        make_face()
        with BuildLine():
            Line((-54.9926131403, -31.75), (0, 0))
            Line((0, 0), (-61.9079224235, -14.1300793062))
            ThreePointArc((-61.9079224235, -14.1300793062), (-59.1104830389, -23.1991550473), (-54.9926131403, -31.75))
        make_face()
        with BuildLine():
            Line((-61.9079224235, -14.1300793062), (0, 0))
            Line((0, 0), (-63.322441121, 4.7453609427))
            ThreePointArc((-63.322441121, 4.7453609427), (-63.322441121, -4.7453609427), (-61.9079224235, -14.1300793062))
        make_face()
        with BuildLine():
            Line((-63.322441121, 4.7453609427), (0, 0))
            Line((0, 0), (-59.1104830389, 23.1991550473))
            ThreePointArc((-59.1104830389, 23.1991550473), (-61.9079224235, 14.1300793062), (-63.322441121, 4.7453609427))
        make_face()
        with BuildLine():
            Line((-59.1104830389, 23.1991550473), (0, 0))
            Line((0, 0), (-49.6462991367, 39.591602418))
            ThreePointArc((-49.6462991367, 39.591602418), (-54.9926131403, 31.75), (-59.1104830389, 23.1991550473))
        make_face()
    extrude(amount=F6_DEPTH)

    # F0 (on Right) → F7 (join)
    with BuildSketch(Plane.YZ):
        with BuildLine():
            Line((-49.6462991367, 39.591602418), (0, 0))
            Line((0, 0), (-27.551617434, 57.2115231118))
            ThreePointArc((-27.551617434, 57.2115231118), (-39.591602418, 49.6462991367), (-49.6462991367, 39.591602418))
        make_face()
        with BuildLine():
            Line((-59.1104830389, 23.1991550473), (0, 0))
            Line((0, 0), (-49.6462991367, 39.591602418))
            ThreePointArc((-49.6462991367, 39.591602418), (-54.9926131403, 31.75), (-59.1104830389, 23.1991550473))
        make_face()
        with BuildLine():
            Line((-63.322441121, 4.7453609427), (0, 0))
            Line((0, 0), (-59.1104830389, 23.1991550473))
            ThreePointArc((-59.1104830389, 23.1991550473), (-61.9079224235, 14.1300793062), (-63.322441121, 4.7453609427))
        make_face()
        with BuildLine():
            Line((-61.9079224235, -14.1300793062), (0, 0))
            Line((0, 0), (-63.322441121, 4.7453609427))
            ThreePointArc((-63.322441121, 4.7453609427), (-63.322441121, -4.7453609427), (-61.9079224235, -14.1300793062))
        make_face()
        with BuildLine():
            Line((-54.9926131403, -31.75), (0, 0))
            Line((0, 0), (-61.9079224235, -14.1300793062))
            ThreePointArc((-61.9079224235, -14.1300793062), (-59.1104830389, -23.1991550473), (-54.9926131403, -31.75))
        make_face()
        with BuildLine():
            Line((-43.1909688485, -46.5487938612), (0, 0))
            Line((0, 0), (-54.9926131403, -31.75))
            ThreePointArc((-54.9926131403, -31.75), (-49.6462991367, -39.591602418), (-43.1909688485, -46.5487938612))
        make_face()
        with BuildLine():
            Line((-27.551617434, -57.2115231118), (0, 0))
            Line((0, 0), (-43.1909688485, -46.5487938612))
            ThreePointArc((-43.1909688485, -46.5487938612), (-35.770823687, -52.4661621691), (-27.551617434, -57.2115231118))
        make_face()
        with BuildLine():
            Line((-9.4641839022, -62.7907574653), (0, 0))
            Line((0, 0), (-27.551617434, -57.2115231118))
            ThreePointArc((-27.551617434, -57.2115231118), (-18.7169535751, -60.6788731674), (-9.4641839022, -62.7907574653))
        make_face()
        with BuildLine():
            Line((9.4641839022, -62.7907574653), (0, 0))
            Line((0, 0), (-9.4641839022, -62.7907574653))
            ThreePointArc((-9.4641839022, -62.7907574653), (0, -63.5), (9.4641839022, -62.7907574653))
        make_face()
        with BuildLine():
            Line((27.551617434, -57.2115231118), (0, 0))
            Line((0, 0), (9.4641839022, -62.7907574653))
            ThreePointArc((9.4641839022, -62.7907574653), (18.7169535751, -60.6788731674), (27.551617434, -57.2115231118))
        make_face()
        with BuildLine():
            Line((43.1909688485, -46.5487938612), (0, 0))
            Line((0, 0), (27.551617434, -57.2115231118))
            ThreePointArc((27.551617434, -57.2115231118), (35.770823687, -52.4661621691), (43.1909688485, -46.5487938612))
        make_face()
        with BuildLine():
            Line((54.9926131403, -31.75), (0, 0))
            Line((0, 0), (43.1909688485, -46.5487938612))
            ThreePointArc((43.1909688485, -46.5487938612), (49.6462991367, -39.591602418), (54.9926131403, -31.75))
        make_face()
        with BuildLine():
            Line((61.9079224235, -14.1300793062), (0, 0))
            Line((0, 0), (54.9926131403, -31.75))
            ThreePointArc((54.9926131403, -31.75), (59.1104830389, -23.1991550473), (61.9079224235, -14.1300793062))
        make_face()
        with BuildLine():
            ThreePointArc((63.5, 0), (63.4555947541, 2.3743408365), (63.322441121, 4.7453609427))
            Line((63.322441121, 4.7453609427), (0, 0))
            Line((0, 0), (61.9079224235, -14.1300793062))
            ThreePointArc((61.9079224235, -14.1300793062), (63.1007253282, -7.1097442326), (63.5, 0))
        make_face()
        with BuildLine():
            Line((0, 0), (63.322441121, 4.7453609427))
            ThreePointArc((63.322441121, 4.7453609427), (61.9079224235, 14.1300793062), (59.1104830389, 23.1991550473))
            Line((59.1104830389, 23.1991550473), (0, 0))
        make_face()
        with BuildLine():
            Line((49.6462991367, 39.591602418), (0, 0))
            Line((0, 0), (59.1104830389, 23.1991550473))
            ThreePointArc((59.1104830389, 23.1991550473), (54.9926131403, 31.75), (49.6462991367, 39.591602418))
        make_face()
        with BuildLine():
            Line((27.551617434, 57.2115231118), (0, 0))
            Line((0, 0), (49.6462991367, 39.591602418))
            ThreePointArc((49.6462991367, 39.591602418), (39.591602418, 49.6462991367), (27.551617434, 57.2115231118))
        make_face()
        with BuildLine():
            Line((0, 63.5), (0, 0))
            Line((0, 0), (27.551617434, 57.2115231118))
            ThreePointArc((27.551617434, 57.2115231118), (14.1300793062, 61.9079224235), (0, 63.5))
        make_face()
        with BuildLine():
            Line((-27.551617434, 57.2115231118), (0, 0))
            Line((0, 0), (0, 63.5))
            ThreePointArc((0, 63.5), (-14.1300793062, 61.9079224235), (-27.551617434, 57.2115231118))
        make_face()
    extrude(amount=F7_DEPTH)


solid = f1.part
